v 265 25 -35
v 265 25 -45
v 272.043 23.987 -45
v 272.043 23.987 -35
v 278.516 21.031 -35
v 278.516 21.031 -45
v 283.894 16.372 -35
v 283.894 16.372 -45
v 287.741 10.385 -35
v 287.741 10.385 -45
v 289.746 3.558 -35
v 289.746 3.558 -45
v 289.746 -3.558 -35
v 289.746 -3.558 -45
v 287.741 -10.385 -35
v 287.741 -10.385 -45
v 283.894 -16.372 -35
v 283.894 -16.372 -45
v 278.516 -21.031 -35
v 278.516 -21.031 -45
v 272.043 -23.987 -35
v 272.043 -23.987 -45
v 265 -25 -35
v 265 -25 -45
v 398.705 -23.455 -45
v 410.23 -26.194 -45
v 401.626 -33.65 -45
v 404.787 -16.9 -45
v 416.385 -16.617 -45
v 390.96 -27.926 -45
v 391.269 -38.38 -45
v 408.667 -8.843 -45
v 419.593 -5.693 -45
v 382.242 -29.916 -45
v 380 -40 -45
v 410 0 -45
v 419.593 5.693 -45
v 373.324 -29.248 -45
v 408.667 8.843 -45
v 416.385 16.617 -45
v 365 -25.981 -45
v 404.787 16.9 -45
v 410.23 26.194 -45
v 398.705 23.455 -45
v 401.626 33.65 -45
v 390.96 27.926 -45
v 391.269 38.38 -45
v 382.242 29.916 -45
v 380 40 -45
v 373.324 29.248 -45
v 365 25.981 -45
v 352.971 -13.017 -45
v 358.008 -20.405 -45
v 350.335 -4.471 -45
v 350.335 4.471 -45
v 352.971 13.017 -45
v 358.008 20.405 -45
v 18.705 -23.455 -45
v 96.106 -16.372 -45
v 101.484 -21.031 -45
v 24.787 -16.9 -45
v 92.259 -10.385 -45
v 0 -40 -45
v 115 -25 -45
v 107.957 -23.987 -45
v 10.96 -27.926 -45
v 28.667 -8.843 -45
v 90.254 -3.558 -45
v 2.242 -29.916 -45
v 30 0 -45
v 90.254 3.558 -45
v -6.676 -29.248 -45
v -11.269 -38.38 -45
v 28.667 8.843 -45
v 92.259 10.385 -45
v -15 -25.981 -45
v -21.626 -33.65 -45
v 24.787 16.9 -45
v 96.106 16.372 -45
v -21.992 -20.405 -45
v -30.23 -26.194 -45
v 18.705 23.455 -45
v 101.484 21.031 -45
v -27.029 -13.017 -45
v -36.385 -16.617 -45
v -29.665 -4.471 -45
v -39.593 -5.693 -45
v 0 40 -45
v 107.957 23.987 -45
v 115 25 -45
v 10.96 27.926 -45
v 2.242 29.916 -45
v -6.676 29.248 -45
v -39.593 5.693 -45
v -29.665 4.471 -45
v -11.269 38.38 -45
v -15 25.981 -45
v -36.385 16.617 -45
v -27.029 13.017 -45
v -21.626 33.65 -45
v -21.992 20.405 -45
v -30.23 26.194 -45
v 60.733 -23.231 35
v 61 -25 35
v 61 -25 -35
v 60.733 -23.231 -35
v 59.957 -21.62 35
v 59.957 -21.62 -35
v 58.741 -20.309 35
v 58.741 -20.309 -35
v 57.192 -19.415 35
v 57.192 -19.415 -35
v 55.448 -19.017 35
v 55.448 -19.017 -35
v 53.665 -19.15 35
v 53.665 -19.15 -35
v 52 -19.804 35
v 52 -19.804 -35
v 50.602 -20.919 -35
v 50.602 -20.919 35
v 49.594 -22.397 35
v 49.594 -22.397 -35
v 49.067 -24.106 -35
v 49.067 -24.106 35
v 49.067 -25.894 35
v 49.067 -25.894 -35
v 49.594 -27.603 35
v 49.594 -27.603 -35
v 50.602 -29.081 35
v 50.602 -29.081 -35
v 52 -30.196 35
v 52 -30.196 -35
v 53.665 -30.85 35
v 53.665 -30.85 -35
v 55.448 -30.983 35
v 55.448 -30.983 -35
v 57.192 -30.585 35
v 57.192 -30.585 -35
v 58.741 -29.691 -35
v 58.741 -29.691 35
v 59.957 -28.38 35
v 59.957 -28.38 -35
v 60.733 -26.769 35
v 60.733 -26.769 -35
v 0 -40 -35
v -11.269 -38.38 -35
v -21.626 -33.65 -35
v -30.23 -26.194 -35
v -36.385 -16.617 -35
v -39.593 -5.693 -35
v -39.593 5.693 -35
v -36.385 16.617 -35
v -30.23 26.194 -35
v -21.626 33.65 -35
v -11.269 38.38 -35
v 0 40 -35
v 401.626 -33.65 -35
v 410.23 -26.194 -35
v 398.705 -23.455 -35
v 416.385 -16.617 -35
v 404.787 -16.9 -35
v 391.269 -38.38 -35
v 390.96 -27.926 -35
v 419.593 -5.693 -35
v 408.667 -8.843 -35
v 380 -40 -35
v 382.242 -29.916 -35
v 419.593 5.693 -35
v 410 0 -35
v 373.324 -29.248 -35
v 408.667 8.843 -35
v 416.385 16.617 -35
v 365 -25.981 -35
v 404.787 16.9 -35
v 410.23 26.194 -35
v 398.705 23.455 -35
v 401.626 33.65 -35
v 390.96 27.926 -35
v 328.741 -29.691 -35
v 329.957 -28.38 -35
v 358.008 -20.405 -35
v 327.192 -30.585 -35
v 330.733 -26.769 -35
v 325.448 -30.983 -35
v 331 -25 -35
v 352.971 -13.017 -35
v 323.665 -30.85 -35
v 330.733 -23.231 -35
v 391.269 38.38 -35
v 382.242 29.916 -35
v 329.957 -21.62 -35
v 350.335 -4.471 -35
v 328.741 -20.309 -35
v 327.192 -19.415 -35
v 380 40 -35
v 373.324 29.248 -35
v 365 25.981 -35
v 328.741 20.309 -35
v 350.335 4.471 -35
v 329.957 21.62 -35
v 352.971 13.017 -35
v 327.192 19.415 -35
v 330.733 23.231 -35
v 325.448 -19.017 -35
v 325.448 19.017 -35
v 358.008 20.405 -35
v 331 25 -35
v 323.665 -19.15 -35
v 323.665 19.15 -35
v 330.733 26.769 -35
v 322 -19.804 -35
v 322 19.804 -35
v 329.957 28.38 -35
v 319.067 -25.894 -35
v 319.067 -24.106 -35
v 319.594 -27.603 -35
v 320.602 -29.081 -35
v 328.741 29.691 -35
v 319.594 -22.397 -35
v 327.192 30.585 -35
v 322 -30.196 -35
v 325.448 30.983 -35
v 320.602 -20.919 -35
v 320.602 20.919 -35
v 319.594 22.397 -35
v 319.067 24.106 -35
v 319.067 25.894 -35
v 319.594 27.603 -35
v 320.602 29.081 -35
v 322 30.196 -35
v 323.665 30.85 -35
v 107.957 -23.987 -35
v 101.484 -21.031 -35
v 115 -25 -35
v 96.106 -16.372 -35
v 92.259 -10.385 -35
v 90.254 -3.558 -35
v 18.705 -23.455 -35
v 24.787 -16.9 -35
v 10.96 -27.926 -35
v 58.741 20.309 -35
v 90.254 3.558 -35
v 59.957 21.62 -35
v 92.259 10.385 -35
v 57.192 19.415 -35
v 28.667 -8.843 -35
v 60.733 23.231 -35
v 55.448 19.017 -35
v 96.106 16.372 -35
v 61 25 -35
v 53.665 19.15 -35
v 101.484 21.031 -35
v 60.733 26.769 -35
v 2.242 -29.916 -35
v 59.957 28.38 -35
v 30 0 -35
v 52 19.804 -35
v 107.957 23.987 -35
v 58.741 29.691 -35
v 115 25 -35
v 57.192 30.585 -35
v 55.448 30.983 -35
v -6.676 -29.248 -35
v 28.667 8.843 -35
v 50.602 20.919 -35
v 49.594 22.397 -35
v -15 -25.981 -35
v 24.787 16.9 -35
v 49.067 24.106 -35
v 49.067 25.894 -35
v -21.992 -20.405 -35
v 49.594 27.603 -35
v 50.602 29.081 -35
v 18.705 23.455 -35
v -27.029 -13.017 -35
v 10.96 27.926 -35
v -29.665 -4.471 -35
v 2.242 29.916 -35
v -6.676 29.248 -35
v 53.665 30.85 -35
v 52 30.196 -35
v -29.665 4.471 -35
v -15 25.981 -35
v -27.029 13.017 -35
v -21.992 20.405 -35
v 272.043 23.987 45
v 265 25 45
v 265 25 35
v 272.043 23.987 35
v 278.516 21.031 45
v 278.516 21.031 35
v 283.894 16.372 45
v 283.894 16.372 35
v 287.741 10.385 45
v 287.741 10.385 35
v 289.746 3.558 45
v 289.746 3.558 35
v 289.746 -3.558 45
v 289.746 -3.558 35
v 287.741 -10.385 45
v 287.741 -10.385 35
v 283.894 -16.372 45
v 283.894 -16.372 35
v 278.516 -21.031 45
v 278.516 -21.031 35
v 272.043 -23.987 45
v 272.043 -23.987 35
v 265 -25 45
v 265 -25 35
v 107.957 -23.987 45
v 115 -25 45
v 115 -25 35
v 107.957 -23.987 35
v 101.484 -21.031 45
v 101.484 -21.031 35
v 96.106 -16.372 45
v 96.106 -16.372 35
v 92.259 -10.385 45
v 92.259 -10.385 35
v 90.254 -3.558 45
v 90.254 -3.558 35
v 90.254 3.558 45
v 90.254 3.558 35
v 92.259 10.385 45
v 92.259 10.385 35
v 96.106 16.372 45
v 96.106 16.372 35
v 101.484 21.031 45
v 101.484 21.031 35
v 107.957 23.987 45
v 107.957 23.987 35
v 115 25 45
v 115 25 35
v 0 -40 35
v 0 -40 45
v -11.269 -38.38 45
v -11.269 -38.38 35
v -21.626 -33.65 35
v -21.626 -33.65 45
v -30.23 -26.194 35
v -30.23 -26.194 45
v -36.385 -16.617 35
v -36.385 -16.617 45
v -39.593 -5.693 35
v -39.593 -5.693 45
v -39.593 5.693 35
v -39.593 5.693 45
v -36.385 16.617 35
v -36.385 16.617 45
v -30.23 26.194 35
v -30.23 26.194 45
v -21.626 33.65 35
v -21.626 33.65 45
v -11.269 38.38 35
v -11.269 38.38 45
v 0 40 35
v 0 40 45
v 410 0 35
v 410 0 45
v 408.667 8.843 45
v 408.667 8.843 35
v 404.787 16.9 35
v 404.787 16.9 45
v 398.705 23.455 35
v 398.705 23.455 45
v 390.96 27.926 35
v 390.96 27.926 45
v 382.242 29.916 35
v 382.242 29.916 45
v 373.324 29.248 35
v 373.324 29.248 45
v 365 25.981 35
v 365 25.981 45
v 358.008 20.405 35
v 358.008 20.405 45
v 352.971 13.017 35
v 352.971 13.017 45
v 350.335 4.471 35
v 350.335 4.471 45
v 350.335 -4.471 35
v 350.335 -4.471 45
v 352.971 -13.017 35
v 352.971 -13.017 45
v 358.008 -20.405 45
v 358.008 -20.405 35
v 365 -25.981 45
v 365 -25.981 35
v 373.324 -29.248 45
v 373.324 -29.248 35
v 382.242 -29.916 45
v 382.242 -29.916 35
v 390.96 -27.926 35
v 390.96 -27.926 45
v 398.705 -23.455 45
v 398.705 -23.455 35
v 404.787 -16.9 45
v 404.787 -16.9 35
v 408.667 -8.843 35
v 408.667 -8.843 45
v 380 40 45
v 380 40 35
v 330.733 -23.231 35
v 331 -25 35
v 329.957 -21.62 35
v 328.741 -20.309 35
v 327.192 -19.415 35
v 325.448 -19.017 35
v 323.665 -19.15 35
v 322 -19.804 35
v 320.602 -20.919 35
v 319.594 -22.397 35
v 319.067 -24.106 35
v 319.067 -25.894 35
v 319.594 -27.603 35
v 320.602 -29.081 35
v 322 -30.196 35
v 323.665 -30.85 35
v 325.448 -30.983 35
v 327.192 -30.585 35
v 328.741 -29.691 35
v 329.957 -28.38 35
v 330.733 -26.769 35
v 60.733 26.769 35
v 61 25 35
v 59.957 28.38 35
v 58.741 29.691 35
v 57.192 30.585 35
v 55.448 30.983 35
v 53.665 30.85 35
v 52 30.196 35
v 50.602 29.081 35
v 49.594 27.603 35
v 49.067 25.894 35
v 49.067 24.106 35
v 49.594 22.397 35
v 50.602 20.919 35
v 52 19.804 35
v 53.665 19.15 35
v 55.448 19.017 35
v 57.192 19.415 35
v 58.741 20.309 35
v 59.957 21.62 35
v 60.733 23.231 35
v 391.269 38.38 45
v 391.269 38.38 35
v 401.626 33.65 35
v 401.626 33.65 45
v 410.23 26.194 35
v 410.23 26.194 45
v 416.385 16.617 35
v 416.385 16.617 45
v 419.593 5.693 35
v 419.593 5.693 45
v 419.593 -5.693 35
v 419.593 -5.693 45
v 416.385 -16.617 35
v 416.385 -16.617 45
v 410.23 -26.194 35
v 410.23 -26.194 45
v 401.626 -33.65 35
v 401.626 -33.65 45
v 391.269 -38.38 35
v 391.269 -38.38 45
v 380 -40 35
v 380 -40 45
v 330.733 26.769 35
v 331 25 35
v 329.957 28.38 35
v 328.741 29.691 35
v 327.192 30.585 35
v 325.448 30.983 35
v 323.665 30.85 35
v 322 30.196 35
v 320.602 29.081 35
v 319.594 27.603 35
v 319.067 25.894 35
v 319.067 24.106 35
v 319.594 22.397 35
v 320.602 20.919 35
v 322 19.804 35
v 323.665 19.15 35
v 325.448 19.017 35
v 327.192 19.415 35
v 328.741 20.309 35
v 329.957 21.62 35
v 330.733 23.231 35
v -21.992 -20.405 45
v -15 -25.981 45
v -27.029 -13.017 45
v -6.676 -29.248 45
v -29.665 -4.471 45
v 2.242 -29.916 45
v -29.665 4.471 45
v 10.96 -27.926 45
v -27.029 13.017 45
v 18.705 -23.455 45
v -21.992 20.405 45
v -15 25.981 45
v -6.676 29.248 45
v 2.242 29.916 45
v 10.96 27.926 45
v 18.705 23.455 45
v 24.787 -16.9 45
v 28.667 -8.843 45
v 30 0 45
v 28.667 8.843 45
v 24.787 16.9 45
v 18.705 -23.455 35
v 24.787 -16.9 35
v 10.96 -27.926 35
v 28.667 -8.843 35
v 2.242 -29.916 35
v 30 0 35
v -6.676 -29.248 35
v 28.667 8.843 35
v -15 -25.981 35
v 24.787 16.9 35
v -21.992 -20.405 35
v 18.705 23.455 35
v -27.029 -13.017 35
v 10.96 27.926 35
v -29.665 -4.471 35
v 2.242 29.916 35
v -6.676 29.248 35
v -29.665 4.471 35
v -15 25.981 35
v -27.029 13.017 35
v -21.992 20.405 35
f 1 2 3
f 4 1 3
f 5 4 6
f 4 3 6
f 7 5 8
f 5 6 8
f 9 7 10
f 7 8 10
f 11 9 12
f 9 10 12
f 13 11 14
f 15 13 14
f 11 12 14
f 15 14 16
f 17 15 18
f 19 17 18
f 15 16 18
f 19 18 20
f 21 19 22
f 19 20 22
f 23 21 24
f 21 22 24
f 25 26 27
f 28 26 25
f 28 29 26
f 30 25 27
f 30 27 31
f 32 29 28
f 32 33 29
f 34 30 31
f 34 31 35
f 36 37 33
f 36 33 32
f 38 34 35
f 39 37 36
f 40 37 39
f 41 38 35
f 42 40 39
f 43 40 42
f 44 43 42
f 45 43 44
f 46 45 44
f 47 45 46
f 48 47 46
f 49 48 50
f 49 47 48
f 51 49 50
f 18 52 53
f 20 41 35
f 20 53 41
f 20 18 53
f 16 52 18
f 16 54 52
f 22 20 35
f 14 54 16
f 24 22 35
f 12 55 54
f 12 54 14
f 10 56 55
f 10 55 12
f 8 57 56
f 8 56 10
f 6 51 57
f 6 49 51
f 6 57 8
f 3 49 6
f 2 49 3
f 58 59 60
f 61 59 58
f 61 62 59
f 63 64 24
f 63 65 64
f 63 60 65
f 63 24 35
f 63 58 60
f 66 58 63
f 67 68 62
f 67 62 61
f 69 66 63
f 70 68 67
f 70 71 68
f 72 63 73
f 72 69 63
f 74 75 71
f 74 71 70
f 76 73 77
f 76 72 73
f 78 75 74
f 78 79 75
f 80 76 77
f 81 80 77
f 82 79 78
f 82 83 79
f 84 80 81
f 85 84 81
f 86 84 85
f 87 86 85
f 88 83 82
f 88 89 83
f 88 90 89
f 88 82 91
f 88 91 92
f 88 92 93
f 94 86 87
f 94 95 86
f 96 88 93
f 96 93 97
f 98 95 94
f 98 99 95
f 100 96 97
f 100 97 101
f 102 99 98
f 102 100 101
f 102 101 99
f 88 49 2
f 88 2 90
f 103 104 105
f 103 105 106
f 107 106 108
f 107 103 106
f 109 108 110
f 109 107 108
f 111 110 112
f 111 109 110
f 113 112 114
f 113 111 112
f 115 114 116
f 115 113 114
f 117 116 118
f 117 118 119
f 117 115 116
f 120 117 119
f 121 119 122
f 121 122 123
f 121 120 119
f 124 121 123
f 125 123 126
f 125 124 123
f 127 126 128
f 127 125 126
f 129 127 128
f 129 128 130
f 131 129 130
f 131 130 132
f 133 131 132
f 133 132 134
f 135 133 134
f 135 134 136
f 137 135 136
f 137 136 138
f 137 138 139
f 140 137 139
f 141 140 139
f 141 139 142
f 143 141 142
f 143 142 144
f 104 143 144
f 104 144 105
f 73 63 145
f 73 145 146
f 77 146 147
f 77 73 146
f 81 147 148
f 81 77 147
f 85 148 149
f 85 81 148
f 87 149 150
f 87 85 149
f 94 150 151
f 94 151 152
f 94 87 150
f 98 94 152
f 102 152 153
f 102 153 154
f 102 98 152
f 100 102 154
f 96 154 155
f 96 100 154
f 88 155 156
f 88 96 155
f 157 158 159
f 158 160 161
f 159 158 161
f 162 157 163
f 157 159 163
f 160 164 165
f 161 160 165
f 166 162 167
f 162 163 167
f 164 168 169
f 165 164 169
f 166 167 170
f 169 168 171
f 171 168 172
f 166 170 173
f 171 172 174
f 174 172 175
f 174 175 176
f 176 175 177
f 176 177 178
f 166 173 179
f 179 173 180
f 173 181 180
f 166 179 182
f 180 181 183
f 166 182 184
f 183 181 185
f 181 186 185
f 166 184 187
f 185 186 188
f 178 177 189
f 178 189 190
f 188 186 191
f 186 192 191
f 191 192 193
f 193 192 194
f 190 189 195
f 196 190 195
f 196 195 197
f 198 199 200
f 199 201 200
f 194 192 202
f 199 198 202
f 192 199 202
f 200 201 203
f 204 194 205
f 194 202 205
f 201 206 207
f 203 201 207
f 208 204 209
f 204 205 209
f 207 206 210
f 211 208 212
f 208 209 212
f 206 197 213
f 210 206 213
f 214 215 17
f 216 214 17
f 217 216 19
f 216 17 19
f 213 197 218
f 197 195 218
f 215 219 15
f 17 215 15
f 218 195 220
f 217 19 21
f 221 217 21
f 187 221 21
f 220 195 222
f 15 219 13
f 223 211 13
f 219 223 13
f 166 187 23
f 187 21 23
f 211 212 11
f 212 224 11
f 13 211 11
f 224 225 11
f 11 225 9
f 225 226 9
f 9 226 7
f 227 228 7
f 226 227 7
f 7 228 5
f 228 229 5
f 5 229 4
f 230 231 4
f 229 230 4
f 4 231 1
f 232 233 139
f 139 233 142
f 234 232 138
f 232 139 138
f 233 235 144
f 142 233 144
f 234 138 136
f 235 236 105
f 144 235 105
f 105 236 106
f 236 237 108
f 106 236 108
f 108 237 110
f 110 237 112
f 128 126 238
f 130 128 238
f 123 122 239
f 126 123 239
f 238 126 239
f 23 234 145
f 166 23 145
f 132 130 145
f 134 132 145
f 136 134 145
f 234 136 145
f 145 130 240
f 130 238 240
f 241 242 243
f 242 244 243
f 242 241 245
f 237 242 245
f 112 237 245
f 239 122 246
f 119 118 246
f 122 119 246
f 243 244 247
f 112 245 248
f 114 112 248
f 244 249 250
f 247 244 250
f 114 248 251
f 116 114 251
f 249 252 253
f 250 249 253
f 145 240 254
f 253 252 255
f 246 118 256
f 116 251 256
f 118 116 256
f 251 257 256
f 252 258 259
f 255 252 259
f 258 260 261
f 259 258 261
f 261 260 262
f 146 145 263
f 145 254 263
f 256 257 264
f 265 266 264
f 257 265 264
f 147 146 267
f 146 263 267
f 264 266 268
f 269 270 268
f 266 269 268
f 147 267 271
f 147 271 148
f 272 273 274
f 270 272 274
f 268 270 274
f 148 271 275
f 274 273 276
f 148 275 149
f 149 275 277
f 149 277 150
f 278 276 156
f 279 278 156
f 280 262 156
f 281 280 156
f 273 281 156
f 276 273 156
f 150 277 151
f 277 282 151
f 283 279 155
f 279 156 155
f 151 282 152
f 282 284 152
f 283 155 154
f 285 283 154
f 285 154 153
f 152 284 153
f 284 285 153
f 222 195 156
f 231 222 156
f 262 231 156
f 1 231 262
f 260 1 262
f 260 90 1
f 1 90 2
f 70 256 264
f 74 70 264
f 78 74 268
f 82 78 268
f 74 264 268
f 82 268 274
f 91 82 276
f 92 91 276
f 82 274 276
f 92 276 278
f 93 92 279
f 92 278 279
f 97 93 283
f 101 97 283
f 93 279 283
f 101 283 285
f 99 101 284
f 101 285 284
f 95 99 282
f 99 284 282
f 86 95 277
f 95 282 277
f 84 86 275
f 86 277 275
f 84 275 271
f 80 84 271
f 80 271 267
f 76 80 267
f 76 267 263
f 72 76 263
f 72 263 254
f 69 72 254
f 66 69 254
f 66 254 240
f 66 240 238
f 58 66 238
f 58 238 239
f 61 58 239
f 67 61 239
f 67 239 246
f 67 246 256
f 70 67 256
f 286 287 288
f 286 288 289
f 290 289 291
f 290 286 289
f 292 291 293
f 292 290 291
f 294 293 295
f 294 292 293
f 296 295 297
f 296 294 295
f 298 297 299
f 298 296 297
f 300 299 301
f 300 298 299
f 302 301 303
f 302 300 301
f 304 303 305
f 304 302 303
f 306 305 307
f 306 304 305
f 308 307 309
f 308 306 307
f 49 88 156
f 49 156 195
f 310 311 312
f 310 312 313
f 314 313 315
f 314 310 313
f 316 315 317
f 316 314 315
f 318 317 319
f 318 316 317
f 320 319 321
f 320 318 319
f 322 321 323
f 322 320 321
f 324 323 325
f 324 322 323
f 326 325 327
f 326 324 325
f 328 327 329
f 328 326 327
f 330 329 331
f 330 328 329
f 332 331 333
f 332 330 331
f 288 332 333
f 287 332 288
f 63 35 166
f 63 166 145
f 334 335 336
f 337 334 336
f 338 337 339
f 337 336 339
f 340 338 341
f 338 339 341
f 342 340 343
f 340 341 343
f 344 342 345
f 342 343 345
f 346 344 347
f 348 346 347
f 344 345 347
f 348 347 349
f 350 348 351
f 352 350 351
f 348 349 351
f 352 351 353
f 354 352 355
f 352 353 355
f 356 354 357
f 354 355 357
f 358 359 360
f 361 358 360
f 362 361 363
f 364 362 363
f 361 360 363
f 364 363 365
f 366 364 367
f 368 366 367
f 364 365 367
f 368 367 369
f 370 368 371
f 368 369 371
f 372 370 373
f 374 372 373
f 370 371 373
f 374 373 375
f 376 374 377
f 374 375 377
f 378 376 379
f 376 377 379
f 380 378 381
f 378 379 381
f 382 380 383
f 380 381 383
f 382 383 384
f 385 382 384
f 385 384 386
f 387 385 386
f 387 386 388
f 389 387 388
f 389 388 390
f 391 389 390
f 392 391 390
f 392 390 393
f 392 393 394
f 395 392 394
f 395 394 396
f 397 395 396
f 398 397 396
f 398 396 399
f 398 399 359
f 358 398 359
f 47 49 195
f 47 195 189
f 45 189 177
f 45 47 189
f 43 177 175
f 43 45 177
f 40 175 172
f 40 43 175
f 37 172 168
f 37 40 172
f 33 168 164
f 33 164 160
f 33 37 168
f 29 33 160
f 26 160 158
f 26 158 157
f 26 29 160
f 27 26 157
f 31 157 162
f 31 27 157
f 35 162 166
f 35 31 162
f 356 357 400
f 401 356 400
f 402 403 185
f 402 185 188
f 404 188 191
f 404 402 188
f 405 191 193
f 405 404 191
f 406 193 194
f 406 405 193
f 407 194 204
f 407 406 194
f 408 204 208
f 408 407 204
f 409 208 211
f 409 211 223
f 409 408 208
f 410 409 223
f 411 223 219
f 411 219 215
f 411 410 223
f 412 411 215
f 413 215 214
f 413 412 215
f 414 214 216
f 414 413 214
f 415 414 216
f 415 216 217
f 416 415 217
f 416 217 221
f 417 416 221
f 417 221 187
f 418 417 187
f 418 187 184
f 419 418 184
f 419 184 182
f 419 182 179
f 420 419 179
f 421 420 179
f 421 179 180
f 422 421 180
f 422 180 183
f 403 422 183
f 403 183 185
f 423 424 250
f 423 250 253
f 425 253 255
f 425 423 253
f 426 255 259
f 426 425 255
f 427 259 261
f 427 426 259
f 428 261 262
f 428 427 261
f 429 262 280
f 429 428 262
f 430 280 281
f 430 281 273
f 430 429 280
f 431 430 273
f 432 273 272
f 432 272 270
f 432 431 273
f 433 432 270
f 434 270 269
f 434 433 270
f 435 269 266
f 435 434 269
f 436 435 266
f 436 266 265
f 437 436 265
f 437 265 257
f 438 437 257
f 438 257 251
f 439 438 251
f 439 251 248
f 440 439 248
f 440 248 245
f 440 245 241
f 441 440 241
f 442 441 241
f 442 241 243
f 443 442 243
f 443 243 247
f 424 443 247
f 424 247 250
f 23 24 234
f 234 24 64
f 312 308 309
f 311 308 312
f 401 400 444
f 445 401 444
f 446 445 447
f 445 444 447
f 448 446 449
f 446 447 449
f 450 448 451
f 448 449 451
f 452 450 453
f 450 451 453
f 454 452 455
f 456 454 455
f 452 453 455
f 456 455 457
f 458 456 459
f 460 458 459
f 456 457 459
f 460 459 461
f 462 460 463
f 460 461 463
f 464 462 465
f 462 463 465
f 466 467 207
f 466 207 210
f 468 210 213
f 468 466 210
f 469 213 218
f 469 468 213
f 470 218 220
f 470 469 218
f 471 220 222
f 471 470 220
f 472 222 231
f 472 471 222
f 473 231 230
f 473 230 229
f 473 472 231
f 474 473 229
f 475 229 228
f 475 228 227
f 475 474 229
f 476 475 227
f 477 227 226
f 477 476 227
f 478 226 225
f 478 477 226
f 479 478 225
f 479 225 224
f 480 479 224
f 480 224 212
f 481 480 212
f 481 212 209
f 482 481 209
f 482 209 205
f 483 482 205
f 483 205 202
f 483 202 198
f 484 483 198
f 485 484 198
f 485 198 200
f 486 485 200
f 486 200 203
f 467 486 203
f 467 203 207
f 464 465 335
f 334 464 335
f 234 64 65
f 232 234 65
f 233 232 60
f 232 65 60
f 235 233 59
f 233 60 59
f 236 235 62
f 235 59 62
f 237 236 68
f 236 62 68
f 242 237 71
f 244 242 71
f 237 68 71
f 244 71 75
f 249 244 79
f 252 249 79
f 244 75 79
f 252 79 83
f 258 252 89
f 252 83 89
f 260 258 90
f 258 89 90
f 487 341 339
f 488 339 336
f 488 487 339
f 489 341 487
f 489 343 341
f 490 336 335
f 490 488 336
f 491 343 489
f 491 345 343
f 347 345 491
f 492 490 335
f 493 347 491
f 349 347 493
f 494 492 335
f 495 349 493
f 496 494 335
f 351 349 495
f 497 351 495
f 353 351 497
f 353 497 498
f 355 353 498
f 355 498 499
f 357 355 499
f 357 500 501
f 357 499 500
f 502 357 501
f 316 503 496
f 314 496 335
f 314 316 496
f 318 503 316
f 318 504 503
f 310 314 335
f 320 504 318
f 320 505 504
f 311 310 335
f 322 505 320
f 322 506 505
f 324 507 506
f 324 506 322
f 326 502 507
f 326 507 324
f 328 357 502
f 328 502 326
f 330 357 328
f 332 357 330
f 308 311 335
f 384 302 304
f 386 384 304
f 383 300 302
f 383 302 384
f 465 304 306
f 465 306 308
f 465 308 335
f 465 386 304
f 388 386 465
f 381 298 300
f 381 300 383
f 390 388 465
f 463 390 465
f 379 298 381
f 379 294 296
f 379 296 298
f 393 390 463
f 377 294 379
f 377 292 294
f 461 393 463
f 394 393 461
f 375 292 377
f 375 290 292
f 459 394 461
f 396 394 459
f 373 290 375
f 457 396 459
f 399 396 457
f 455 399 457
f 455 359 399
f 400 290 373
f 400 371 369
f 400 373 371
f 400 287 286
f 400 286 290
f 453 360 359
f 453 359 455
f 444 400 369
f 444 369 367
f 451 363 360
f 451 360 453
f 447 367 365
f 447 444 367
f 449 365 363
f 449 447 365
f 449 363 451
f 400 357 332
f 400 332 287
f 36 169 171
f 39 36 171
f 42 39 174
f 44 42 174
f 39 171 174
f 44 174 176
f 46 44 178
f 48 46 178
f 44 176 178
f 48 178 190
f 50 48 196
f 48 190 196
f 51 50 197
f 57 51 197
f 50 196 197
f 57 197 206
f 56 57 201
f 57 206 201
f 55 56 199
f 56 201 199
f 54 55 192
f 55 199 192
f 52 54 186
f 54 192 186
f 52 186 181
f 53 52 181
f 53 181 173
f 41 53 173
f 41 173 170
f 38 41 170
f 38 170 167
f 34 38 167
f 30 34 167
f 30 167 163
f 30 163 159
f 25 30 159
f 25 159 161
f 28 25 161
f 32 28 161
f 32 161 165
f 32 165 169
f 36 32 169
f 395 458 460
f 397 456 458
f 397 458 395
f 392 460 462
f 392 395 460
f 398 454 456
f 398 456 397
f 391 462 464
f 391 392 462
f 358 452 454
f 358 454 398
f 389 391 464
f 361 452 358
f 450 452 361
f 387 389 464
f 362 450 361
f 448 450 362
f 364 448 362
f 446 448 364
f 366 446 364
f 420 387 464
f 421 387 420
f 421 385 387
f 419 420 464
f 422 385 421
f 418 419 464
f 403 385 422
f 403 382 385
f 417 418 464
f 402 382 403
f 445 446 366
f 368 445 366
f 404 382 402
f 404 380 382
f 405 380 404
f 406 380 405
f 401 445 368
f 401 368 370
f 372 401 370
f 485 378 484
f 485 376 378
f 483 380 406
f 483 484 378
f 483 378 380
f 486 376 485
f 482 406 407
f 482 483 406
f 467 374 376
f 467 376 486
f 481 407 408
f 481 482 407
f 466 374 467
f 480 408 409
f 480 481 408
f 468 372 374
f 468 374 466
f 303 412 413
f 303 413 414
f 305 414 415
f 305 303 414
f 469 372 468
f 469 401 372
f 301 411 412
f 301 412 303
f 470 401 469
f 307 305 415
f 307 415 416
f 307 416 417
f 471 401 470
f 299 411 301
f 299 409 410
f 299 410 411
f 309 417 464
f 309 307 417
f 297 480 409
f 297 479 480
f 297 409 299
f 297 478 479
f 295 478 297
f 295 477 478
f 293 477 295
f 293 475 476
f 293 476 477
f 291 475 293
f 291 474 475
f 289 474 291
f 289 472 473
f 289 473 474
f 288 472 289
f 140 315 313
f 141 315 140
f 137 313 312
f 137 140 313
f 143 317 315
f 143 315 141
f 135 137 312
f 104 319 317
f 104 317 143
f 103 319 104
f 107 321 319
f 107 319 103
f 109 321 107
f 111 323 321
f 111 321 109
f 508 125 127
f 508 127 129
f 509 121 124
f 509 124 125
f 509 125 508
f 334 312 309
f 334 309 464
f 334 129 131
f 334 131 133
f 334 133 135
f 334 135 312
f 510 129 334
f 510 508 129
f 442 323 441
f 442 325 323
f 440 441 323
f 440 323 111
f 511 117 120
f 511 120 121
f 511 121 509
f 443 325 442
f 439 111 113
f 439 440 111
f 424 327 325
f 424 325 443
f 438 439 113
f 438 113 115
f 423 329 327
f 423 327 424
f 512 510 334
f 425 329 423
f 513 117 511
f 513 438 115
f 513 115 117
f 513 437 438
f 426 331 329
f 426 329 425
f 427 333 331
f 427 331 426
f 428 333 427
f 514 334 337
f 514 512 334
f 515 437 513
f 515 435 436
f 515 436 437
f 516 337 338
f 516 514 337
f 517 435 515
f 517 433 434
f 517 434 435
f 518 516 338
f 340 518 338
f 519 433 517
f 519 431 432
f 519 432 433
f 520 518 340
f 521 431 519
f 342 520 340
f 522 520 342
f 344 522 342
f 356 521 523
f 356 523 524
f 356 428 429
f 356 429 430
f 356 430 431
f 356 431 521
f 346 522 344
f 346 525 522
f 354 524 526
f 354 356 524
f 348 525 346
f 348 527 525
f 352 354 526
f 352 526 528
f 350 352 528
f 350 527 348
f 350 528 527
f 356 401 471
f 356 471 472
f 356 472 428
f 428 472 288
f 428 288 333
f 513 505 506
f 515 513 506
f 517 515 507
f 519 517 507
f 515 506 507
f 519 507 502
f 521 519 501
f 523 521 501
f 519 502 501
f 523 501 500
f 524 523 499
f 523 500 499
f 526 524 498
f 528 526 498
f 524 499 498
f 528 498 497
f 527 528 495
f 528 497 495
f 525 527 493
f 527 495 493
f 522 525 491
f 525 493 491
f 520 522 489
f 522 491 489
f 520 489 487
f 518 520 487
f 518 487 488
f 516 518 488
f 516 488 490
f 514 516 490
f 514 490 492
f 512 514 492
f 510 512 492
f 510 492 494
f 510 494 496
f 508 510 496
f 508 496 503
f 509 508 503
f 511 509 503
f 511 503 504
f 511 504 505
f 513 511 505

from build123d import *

# Parameters (mm, degrees)
SKETCH2_R           = 30
BOSS_EXTRUDE1_DEPTH = 52.5
BOSS_EXTRUDE2_DEPTH = 10
CUT_EXTRUDE1_DEPTH  = 434.01991871
SKETCH5_R           = 30
BOSS_EXTRUDE3_DEPTH = 52.5
SKETCH7_R           = 6
BOSS_EXTRUDE4_DEPTH = 80
SKETCH8_R           = 30
CUT_EXTRUDE2_DEPTH  = 435.770054167


with BuildPart() as part:
    # Sketch2 → Boss-Extrude1 (new, symmetric)
    with BuildSketch(Plane.XY):
        Circle(SKETCH2_R)
    extrude(amount=BOSS_EXTRUDE1_DEPTH, both=True)

    # Sketch3 → Boss-Extrude2 (add)
    with BuildSketch(Plane.XY.offset(45)):
        with BuildLine():
            Line((0, 40), (380, 40))
            ThreePointArc((380, 40), (420, 0), (380, -40))
            Line((380, -40), (0, -40))
            ThreePointArc((0, -40), (-40, 0), (0, 40))
        make_face()
    boss_extrude2 = extrude(amount=-BOSS_EXTRUDE2_DEPTH)

    # Sketch4 → Cut-Extrude1 (cut, through all)
    with BuildSketch(Plane.XY.offset(45)):
        with BuildLine():
            Line((265, -25), (115, -25))
            ThreePointArc((115, -25), (90, 0), (115, 25))
            Line((115, 25), (265, 25))
            ThreePointArc((265, 25), (290, 0), (265, -25))
        make_face()
    cut_extrude1 = extrude(amount=-CUT_EXTRUDE1_DEPTH, mode=Mode.SUBTRACT)

    # Sketch5 → Boss-Extrude3 (add, symmetric)
    with BuildSketch(Plane.XY):
        with Locations((380, 0)):
            Circle(SKETCH5_R)
    extrude(amount=BOSS_EXTRUDE3_DEPTH, both=True)

    # Mirror1: Boss-Extrude2, Cut-Extrude1 across plane
    add(boss_extrude2.mirror(Plane.XY))
    add(cut_extrude1.mirror(Plane.XY), mode=Mode.SUBTRACT)

    # Sketch7 → Boss-Extrude4 (add)
    with BuildSketch(Plane.XY.offset(45)):
        with Locations((55, 25)):
            Circle(SKETCH7_R)
        with Locations((325, 25)):
            Circle(SKETCH7_R)
        with Locations((325, -25)):
            Circle(SKETCH7_R)
        with Locations((55, -25)):
            Circle(SKETCH7_R)
    extrude(amount=-BOSS_EXTRUDE4_DEPTH)

    # Sketch8 → Cut-Extrude2 (cut, through all)
    with BuildSketch(Plane.XY.offset(52.5)):
        Circle(SKETCH8_R)
        with Locations((380, 0)):
            Circle(SKETCH8_R)
    extrude(amount=-CUT_EXTRUDE2_DEPTH, mode=Mode.SUBTRACT)


solid = part.part
